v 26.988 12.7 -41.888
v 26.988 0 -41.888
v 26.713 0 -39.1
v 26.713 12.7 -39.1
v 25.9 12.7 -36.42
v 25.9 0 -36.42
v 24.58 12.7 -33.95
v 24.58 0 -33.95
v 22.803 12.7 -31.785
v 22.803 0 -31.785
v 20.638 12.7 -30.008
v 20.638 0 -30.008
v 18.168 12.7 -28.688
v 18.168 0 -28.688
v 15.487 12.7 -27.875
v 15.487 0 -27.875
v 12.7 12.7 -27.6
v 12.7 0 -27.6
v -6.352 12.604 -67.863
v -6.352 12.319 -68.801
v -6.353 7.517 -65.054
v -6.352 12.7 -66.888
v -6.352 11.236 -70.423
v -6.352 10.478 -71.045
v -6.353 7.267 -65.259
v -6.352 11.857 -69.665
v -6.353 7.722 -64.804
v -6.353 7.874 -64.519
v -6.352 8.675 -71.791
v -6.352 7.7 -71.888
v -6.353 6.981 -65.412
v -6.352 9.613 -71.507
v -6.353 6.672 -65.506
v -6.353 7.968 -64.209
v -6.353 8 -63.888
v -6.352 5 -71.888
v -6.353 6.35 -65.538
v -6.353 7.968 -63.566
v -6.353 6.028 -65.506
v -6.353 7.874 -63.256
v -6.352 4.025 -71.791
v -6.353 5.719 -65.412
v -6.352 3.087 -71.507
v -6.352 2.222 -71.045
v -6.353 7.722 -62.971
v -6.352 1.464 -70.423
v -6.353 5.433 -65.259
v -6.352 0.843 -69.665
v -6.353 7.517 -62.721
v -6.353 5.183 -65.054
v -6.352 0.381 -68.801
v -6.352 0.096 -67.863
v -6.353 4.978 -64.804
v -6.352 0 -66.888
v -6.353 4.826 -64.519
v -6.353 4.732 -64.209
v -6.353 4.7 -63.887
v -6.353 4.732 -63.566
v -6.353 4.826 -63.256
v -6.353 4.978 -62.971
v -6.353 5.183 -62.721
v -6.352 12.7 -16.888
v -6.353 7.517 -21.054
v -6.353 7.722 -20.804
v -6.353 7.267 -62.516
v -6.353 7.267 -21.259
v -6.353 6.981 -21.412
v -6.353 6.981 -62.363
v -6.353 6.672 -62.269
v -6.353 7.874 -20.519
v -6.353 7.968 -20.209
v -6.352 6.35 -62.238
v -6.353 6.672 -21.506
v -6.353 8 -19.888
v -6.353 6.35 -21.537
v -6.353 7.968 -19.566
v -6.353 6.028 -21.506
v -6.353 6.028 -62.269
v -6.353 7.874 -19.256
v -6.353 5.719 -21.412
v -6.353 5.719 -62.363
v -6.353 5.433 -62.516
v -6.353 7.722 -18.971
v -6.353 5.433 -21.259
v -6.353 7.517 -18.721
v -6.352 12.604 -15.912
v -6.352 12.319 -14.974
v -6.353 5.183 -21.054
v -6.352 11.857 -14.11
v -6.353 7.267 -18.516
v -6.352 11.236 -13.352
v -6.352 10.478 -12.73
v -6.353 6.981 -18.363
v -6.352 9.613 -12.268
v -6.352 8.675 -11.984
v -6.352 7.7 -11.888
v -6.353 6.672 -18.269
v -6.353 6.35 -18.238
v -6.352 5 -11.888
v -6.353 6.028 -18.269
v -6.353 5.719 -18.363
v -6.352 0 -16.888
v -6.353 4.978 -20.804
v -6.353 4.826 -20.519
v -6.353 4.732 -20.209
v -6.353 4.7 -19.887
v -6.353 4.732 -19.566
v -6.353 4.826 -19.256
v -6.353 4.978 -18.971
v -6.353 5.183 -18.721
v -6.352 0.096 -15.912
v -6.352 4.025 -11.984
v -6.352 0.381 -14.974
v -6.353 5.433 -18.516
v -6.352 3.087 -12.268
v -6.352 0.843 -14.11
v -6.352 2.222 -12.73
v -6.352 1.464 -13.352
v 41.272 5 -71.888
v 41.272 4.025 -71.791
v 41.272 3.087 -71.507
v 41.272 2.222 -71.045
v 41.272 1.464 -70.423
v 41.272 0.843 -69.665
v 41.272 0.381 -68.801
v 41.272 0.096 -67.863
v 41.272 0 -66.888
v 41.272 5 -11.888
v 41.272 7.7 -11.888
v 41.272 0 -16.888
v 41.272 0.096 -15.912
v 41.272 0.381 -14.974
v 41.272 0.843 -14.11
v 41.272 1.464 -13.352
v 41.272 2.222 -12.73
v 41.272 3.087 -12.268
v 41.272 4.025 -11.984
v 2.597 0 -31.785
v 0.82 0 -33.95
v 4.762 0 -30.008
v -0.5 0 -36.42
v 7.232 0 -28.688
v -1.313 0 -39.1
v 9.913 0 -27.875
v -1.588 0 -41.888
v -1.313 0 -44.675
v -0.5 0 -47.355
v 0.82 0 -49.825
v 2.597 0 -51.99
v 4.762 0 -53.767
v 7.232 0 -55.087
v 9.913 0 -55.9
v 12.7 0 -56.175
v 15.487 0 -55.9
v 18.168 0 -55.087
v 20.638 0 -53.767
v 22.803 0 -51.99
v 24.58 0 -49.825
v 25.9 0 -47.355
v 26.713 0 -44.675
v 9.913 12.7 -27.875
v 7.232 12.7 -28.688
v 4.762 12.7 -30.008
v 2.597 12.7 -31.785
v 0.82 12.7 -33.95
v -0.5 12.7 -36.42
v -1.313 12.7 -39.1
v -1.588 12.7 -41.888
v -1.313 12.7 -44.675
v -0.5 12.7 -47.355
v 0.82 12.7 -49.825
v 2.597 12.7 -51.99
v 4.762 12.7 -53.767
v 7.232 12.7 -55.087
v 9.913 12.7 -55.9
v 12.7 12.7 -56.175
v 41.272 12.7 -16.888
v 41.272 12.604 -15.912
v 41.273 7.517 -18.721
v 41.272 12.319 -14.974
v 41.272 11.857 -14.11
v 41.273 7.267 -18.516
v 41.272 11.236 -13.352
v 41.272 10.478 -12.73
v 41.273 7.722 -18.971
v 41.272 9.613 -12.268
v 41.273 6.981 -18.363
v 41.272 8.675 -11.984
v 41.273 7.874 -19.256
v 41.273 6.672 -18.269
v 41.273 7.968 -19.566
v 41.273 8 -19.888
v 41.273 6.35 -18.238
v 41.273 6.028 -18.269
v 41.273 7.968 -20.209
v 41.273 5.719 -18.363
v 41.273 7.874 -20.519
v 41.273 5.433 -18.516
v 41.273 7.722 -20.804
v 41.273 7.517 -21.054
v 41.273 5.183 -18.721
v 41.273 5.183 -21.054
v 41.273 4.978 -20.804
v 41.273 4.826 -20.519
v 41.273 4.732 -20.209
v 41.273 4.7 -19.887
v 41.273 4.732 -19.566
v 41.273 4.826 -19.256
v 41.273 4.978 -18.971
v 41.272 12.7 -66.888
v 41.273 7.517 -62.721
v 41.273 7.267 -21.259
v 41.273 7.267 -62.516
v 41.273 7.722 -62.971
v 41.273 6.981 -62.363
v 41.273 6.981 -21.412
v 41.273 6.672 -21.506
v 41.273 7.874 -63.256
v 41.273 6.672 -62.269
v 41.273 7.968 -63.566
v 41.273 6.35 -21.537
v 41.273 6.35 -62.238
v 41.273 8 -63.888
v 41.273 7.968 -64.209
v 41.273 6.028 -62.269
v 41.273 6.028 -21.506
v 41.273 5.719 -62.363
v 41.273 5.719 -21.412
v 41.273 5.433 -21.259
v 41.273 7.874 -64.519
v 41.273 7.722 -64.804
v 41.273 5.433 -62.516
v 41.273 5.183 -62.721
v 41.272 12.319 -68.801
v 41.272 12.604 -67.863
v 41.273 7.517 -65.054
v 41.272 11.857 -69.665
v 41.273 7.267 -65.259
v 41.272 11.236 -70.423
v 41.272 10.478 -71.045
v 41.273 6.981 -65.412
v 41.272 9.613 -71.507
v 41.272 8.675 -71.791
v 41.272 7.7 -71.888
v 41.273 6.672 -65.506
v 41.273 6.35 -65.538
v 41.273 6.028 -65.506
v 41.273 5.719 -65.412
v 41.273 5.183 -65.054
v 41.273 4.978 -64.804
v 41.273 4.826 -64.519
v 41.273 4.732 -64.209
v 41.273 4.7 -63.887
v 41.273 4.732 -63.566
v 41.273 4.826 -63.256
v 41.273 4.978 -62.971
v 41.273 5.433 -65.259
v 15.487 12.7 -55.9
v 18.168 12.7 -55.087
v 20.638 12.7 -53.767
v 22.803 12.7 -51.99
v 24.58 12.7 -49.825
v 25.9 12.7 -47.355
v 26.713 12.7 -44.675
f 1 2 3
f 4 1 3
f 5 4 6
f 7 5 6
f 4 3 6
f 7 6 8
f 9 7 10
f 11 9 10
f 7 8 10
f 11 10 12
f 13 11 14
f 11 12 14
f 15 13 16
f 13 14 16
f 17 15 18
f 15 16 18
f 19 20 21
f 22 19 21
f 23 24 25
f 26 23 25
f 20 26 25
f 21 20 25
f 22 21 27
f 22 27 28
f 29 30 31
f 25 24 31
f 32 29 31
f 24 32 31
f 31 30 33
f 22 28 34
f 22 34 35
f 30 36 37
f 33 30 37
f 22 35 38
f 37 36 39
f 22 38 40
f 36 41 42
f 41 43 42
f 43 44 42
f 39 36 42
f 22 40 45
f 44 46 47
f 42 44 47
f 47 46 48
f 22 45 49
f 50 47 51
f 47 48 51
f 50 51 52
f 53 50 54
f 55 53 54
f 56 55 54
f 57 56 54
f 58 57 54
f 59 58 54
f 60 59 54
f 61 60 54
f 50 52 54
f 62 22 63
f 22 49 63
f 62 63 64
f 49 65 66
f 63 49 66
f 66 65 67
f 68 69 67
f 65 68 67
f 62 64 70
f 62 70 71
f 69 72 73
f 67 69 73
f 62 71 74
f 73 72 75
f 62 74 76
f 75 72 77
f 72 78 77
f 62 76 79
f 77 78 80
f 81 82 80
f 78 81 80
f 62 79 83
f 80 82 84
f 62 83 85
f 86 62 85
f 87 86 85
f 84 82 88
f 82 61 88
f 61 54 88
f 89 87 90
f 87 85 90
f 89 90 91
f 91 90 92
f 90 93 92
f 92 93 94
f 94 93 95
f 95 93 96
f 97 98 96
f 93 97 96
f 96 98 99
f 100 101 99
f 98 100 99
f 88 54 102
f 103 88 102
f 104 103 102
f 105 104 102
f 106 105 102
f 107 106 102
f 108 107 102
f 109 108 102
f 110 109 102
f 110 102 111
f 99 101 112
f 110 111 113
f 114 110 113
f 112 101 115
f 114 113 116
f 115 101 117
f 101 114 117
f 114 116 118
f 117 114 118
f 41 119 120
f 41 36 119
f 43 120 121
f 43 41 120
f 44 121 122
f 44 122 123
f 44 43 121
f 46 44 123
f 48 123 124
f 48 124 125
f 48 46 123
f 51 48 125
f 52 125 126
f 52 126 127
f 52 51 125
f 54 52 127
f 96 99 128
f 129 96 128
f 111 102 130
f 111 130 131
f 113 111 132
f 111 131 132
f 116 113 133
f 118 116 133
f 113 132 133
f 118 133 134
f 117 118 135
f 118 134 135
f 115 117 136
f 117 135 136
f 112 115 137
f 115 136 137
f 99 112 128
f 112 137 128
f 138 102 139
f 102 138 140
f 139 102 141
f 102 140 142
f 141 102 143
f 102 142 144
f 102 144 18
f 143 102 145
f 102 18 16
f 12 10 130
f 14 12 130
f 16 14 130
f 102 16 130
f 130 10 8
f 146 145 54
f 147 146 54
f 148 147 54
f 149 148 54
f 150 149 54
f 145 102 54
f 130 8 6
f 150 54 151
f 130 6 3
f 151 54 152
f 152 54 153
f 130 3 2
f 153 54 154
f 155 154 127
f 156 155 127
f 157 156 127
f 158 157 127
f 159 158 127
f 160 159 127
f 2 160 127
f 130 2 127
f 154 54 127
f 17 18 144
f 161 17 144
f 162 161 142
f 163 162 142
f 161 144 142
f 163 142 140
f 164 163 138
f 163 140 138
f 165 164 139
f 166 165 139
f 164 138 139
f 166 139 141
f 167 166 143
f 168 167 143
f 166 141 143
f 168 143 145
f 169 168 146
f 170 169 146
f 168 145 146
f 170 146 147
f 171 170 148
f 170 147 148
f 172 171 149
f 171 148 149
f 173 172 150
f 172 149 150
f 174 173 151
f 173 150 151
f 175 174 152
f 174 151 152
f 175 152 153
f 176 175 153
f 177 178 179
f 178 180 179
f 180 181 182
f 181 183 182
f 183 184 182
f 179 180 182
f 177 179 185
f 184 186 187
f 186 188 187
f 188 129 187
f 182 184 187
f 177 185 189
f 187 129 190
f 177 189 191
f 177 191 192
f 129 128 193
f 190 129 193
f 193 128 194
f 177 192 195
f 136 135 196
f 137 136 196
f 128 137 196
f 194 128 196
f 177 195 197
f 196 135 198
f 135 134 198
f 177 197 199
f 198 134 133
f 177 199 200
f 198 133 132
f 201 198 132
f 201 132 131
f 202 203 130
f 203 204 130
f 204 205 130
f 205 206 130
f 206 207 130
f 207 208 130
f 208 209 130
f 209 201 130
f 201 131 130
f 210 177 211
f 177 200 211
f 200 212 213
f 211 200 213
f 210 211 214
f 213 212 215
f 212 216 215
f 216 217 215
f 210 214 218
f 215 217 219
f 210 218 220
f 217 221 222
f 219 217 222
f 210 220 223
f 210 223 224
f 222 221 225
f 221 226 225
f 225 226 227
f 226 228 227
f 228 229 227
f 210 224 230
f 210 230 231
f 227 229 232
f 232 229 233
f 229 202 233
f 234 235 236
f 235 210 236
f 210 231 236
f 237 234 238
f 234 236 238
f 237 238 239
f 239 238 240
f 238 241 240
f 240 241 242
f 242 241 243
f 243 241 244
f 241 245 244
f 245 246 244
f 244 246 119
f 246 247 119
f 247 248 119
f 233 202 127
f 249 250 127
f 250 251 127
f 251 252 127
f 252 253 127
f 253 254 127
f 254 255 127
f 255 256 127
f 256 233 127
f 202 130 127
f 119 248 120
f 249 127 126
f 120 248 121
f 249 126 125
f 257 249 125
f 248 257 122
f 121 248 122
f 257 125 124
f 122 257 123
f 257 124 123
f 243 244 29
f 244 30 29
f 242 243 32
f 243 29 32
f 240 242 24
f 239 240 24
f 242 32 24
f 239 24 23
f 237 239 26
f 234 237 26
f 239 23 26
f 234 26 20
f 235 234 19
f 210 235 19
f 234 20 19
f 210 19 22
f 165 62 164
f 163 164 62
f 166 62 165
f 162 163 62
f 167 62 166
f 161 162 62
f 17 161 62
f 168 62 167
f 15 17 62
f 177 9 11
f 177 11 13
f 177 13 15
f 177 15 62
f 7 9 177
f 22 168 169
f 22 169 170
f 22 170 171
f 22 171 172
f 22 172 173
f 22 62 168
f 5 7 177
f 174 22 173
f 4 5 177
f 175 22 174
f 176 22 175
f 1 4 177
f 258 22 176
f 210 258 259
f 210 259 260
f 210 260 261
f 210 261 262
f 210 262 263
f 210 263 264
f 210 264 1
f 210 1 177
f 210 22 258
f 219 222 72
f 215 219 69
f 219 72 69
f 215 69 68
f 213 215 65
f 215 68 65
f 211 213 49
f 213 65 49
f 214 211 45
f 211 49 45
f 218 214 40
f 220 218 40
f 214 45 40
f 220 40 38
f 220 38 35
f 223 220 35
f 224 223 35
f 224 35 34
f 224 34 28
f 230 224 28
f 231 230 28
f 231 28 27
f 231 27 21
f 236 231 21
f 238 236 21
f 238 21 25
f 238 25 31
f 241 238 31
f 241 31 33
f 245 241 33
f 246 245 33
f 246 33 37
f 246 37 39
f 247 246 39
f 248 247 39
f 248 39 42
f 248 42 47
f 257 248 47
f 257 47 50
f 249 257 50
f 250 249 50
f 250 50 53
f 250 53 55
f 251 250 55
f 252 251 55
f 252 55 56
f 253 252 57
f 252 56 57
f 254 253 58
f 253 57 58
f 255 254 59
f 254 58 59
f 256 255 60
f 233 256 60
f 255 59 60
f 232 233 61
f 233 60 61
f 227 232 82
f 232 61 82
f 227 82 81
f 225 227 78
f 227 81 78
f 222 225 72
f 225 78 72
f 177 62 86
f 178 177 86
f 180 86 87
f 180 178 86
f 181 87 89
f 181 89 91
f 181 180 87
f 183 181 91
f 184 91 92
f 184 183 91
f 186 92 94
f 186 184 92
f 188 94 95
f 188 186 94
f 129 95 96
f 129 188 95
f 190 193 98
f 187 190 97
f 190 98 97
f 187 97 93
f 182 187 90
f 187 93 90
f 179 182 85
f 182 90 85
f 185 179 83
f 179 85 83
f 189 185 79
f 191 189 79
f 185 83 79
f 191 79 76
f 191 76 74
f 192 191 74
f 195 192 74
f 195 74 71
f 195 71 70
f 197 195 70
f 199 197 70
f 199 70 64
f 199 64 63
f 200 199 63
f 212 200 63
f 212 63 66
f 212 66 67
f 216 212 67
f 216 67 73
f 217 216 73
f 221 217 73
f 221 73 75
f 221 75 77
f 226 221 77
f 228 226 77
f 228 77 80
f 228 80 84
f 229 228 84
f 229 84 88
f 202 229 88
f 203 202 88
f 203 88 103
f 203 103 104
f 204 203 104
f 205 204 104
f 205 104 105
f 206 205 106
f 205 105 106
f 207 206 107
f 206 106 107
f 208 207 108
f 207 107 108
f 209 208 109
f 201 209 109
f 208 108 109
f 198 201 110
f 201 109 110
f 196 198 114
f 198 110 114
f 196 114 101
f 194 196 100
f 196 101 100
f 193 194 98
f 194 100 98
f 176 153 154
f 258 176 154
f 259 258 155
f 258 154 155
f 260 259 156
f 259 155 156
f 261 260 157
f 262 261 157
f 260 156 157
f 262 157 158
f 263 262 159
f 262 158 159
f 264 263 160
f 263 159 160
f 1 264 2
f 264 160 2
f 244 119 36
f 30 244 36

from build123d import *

# Parameters (mm, degrees)
SKETCH2_W             = 23.81
SKETCH2_H             = 10.7125
SKETCH2_W_2           = 19.0525
SKETCH2_W_3           = 11.11
SKETCH2_W_4           = 9.39
SKETCH2_W_5           = 6.35
SKETCH2_W_6           = 1.725
SKETCH2_W_7           = 1.585
SKETCH2_W_8           = 6.3525
BOSS_EXTRUDE1_DEPTH   = 12.7
M4X0_7_TAPPED_HOLE1_D = 3.3
FILLET1_R             = 5


with BuildPart() as part:
    # Sketch2 → Boss-Extrude1 (new body)
    with BuildSketch(Plane(origin=(0, 0, 0), x_dir=(1, 0, 0), z_dir=(0, 1, 0))):
        with Locations((24.605, 66.53125)):
            Rectangle(SKETCH2_W, SKETCH2_H)
        with Locations((3.17375, 66.53125)):
            Rectangle(SKETCH2_W_2, SKETCH2_H)
        with BuildLine():
            Line((0, 22.6), (1.585, 22.6))
            Line((1.585, 22.6), (3.31, 22.6))
            Line((3.31, 22.6), (12.7, 22.6))
            Line((12.7, 22.6), (12.7, 27.6))
            ThreePointArc((12.7, 27.6), (-1.5875, 41.8875), (12.7, 56.175))
            Line((12.7, 56.175), (12.7, 61.175))
            Line((12.7, 61.175), (-6.3525, 61.175))
            Line((-6.3525, 61.175), (-6.3525, 22.6))
            Line((-6.3525, 22.6), (0, 22.6))
        make_face()
        with BuildLine():
            Line((12.7, 22.6), (23.81, 22.6))
            Line((23.81, 22.6), (30.16, 22.6))
            Line((30.16, 22.6), (36.51, 22.6))
            Line((36.51, 22.6), (36.51, 61.175))
            Line((36.51, 61.175), (12.7, 61.175))
            Line((12.7, 61.175), (12.7, 56.175))
            ThreePointArc((12.7, 56.175), (22.802788136, 51.990288136), (26.9875, 41.8875))
            ThreePointArc((26.9875, 41.8875), (22.802788136, 31.784711864), (12.7, 27.6))
            Line((12.7, 27.6), (12.7, 22.6))
        make_face()
        with Locations((18.255, 17.24375)):
            Rectangle(SKETCH2_W_3, SKETCH2_H)
        with Locations((8.005, 17.24375)):
            Rectangle(SKETCH2_W_4, SKETCH2_H)
        with Locations((26.985, 17.24375)):
            Rectangle(SKETCH2_W_5, SKETCH2_H)
        with Locations((33.335, 17.24375)):
            Rectangle(SKETCH2_W_5, SKETCH2_H)
        with Locations((2.4475, 17.24375)):
            Rectangle(SKETCH2_W_6, SKETCH2_H)
        with Locations((0.7925, 17.24375)):
            Rectangle(SKETCH2_W_7, SKETCH2_H)
        with Locations((-3.17625, 17.24375)):
            Rectangle(SKETCH2_W_8, SKETCH2_H)
        Polygon((36.51, 22.6), (36.51, 11.8875), (41.2725, 11.8875), (41.2725, 71.8875), (36.51, 71.8875), (36.51, 61.175), align=None)
    extrude(amount=BOSS_EXTRUDE1_DEPTH)

    # M4x0.7 Tapped Hole1 (through all)
    with Locations(Plane(origin=(41.2725, 0, 0), x_dir=(0, 0, -1), z_dir=(1, 0, 0))):
        with Locations((63.8875, 6.35), (19.8875, 6.35)):
            Hole(M4X0_7_TAPPED_HOLE1_D / 2)

    # Fillet1
    fillet1_edges = [part.edges().sort_by_distance(p)[0] for p in [
        (17.46, 0, -11.8875),
        (17.46, 12.7, -11.8875),
        (17.46, 12.7, -71.8875),
        (17.46, 0, -71.8875),
    ]]
    fillet(fillet1_edges, radius=FILLET1_R)


solid = part.part
